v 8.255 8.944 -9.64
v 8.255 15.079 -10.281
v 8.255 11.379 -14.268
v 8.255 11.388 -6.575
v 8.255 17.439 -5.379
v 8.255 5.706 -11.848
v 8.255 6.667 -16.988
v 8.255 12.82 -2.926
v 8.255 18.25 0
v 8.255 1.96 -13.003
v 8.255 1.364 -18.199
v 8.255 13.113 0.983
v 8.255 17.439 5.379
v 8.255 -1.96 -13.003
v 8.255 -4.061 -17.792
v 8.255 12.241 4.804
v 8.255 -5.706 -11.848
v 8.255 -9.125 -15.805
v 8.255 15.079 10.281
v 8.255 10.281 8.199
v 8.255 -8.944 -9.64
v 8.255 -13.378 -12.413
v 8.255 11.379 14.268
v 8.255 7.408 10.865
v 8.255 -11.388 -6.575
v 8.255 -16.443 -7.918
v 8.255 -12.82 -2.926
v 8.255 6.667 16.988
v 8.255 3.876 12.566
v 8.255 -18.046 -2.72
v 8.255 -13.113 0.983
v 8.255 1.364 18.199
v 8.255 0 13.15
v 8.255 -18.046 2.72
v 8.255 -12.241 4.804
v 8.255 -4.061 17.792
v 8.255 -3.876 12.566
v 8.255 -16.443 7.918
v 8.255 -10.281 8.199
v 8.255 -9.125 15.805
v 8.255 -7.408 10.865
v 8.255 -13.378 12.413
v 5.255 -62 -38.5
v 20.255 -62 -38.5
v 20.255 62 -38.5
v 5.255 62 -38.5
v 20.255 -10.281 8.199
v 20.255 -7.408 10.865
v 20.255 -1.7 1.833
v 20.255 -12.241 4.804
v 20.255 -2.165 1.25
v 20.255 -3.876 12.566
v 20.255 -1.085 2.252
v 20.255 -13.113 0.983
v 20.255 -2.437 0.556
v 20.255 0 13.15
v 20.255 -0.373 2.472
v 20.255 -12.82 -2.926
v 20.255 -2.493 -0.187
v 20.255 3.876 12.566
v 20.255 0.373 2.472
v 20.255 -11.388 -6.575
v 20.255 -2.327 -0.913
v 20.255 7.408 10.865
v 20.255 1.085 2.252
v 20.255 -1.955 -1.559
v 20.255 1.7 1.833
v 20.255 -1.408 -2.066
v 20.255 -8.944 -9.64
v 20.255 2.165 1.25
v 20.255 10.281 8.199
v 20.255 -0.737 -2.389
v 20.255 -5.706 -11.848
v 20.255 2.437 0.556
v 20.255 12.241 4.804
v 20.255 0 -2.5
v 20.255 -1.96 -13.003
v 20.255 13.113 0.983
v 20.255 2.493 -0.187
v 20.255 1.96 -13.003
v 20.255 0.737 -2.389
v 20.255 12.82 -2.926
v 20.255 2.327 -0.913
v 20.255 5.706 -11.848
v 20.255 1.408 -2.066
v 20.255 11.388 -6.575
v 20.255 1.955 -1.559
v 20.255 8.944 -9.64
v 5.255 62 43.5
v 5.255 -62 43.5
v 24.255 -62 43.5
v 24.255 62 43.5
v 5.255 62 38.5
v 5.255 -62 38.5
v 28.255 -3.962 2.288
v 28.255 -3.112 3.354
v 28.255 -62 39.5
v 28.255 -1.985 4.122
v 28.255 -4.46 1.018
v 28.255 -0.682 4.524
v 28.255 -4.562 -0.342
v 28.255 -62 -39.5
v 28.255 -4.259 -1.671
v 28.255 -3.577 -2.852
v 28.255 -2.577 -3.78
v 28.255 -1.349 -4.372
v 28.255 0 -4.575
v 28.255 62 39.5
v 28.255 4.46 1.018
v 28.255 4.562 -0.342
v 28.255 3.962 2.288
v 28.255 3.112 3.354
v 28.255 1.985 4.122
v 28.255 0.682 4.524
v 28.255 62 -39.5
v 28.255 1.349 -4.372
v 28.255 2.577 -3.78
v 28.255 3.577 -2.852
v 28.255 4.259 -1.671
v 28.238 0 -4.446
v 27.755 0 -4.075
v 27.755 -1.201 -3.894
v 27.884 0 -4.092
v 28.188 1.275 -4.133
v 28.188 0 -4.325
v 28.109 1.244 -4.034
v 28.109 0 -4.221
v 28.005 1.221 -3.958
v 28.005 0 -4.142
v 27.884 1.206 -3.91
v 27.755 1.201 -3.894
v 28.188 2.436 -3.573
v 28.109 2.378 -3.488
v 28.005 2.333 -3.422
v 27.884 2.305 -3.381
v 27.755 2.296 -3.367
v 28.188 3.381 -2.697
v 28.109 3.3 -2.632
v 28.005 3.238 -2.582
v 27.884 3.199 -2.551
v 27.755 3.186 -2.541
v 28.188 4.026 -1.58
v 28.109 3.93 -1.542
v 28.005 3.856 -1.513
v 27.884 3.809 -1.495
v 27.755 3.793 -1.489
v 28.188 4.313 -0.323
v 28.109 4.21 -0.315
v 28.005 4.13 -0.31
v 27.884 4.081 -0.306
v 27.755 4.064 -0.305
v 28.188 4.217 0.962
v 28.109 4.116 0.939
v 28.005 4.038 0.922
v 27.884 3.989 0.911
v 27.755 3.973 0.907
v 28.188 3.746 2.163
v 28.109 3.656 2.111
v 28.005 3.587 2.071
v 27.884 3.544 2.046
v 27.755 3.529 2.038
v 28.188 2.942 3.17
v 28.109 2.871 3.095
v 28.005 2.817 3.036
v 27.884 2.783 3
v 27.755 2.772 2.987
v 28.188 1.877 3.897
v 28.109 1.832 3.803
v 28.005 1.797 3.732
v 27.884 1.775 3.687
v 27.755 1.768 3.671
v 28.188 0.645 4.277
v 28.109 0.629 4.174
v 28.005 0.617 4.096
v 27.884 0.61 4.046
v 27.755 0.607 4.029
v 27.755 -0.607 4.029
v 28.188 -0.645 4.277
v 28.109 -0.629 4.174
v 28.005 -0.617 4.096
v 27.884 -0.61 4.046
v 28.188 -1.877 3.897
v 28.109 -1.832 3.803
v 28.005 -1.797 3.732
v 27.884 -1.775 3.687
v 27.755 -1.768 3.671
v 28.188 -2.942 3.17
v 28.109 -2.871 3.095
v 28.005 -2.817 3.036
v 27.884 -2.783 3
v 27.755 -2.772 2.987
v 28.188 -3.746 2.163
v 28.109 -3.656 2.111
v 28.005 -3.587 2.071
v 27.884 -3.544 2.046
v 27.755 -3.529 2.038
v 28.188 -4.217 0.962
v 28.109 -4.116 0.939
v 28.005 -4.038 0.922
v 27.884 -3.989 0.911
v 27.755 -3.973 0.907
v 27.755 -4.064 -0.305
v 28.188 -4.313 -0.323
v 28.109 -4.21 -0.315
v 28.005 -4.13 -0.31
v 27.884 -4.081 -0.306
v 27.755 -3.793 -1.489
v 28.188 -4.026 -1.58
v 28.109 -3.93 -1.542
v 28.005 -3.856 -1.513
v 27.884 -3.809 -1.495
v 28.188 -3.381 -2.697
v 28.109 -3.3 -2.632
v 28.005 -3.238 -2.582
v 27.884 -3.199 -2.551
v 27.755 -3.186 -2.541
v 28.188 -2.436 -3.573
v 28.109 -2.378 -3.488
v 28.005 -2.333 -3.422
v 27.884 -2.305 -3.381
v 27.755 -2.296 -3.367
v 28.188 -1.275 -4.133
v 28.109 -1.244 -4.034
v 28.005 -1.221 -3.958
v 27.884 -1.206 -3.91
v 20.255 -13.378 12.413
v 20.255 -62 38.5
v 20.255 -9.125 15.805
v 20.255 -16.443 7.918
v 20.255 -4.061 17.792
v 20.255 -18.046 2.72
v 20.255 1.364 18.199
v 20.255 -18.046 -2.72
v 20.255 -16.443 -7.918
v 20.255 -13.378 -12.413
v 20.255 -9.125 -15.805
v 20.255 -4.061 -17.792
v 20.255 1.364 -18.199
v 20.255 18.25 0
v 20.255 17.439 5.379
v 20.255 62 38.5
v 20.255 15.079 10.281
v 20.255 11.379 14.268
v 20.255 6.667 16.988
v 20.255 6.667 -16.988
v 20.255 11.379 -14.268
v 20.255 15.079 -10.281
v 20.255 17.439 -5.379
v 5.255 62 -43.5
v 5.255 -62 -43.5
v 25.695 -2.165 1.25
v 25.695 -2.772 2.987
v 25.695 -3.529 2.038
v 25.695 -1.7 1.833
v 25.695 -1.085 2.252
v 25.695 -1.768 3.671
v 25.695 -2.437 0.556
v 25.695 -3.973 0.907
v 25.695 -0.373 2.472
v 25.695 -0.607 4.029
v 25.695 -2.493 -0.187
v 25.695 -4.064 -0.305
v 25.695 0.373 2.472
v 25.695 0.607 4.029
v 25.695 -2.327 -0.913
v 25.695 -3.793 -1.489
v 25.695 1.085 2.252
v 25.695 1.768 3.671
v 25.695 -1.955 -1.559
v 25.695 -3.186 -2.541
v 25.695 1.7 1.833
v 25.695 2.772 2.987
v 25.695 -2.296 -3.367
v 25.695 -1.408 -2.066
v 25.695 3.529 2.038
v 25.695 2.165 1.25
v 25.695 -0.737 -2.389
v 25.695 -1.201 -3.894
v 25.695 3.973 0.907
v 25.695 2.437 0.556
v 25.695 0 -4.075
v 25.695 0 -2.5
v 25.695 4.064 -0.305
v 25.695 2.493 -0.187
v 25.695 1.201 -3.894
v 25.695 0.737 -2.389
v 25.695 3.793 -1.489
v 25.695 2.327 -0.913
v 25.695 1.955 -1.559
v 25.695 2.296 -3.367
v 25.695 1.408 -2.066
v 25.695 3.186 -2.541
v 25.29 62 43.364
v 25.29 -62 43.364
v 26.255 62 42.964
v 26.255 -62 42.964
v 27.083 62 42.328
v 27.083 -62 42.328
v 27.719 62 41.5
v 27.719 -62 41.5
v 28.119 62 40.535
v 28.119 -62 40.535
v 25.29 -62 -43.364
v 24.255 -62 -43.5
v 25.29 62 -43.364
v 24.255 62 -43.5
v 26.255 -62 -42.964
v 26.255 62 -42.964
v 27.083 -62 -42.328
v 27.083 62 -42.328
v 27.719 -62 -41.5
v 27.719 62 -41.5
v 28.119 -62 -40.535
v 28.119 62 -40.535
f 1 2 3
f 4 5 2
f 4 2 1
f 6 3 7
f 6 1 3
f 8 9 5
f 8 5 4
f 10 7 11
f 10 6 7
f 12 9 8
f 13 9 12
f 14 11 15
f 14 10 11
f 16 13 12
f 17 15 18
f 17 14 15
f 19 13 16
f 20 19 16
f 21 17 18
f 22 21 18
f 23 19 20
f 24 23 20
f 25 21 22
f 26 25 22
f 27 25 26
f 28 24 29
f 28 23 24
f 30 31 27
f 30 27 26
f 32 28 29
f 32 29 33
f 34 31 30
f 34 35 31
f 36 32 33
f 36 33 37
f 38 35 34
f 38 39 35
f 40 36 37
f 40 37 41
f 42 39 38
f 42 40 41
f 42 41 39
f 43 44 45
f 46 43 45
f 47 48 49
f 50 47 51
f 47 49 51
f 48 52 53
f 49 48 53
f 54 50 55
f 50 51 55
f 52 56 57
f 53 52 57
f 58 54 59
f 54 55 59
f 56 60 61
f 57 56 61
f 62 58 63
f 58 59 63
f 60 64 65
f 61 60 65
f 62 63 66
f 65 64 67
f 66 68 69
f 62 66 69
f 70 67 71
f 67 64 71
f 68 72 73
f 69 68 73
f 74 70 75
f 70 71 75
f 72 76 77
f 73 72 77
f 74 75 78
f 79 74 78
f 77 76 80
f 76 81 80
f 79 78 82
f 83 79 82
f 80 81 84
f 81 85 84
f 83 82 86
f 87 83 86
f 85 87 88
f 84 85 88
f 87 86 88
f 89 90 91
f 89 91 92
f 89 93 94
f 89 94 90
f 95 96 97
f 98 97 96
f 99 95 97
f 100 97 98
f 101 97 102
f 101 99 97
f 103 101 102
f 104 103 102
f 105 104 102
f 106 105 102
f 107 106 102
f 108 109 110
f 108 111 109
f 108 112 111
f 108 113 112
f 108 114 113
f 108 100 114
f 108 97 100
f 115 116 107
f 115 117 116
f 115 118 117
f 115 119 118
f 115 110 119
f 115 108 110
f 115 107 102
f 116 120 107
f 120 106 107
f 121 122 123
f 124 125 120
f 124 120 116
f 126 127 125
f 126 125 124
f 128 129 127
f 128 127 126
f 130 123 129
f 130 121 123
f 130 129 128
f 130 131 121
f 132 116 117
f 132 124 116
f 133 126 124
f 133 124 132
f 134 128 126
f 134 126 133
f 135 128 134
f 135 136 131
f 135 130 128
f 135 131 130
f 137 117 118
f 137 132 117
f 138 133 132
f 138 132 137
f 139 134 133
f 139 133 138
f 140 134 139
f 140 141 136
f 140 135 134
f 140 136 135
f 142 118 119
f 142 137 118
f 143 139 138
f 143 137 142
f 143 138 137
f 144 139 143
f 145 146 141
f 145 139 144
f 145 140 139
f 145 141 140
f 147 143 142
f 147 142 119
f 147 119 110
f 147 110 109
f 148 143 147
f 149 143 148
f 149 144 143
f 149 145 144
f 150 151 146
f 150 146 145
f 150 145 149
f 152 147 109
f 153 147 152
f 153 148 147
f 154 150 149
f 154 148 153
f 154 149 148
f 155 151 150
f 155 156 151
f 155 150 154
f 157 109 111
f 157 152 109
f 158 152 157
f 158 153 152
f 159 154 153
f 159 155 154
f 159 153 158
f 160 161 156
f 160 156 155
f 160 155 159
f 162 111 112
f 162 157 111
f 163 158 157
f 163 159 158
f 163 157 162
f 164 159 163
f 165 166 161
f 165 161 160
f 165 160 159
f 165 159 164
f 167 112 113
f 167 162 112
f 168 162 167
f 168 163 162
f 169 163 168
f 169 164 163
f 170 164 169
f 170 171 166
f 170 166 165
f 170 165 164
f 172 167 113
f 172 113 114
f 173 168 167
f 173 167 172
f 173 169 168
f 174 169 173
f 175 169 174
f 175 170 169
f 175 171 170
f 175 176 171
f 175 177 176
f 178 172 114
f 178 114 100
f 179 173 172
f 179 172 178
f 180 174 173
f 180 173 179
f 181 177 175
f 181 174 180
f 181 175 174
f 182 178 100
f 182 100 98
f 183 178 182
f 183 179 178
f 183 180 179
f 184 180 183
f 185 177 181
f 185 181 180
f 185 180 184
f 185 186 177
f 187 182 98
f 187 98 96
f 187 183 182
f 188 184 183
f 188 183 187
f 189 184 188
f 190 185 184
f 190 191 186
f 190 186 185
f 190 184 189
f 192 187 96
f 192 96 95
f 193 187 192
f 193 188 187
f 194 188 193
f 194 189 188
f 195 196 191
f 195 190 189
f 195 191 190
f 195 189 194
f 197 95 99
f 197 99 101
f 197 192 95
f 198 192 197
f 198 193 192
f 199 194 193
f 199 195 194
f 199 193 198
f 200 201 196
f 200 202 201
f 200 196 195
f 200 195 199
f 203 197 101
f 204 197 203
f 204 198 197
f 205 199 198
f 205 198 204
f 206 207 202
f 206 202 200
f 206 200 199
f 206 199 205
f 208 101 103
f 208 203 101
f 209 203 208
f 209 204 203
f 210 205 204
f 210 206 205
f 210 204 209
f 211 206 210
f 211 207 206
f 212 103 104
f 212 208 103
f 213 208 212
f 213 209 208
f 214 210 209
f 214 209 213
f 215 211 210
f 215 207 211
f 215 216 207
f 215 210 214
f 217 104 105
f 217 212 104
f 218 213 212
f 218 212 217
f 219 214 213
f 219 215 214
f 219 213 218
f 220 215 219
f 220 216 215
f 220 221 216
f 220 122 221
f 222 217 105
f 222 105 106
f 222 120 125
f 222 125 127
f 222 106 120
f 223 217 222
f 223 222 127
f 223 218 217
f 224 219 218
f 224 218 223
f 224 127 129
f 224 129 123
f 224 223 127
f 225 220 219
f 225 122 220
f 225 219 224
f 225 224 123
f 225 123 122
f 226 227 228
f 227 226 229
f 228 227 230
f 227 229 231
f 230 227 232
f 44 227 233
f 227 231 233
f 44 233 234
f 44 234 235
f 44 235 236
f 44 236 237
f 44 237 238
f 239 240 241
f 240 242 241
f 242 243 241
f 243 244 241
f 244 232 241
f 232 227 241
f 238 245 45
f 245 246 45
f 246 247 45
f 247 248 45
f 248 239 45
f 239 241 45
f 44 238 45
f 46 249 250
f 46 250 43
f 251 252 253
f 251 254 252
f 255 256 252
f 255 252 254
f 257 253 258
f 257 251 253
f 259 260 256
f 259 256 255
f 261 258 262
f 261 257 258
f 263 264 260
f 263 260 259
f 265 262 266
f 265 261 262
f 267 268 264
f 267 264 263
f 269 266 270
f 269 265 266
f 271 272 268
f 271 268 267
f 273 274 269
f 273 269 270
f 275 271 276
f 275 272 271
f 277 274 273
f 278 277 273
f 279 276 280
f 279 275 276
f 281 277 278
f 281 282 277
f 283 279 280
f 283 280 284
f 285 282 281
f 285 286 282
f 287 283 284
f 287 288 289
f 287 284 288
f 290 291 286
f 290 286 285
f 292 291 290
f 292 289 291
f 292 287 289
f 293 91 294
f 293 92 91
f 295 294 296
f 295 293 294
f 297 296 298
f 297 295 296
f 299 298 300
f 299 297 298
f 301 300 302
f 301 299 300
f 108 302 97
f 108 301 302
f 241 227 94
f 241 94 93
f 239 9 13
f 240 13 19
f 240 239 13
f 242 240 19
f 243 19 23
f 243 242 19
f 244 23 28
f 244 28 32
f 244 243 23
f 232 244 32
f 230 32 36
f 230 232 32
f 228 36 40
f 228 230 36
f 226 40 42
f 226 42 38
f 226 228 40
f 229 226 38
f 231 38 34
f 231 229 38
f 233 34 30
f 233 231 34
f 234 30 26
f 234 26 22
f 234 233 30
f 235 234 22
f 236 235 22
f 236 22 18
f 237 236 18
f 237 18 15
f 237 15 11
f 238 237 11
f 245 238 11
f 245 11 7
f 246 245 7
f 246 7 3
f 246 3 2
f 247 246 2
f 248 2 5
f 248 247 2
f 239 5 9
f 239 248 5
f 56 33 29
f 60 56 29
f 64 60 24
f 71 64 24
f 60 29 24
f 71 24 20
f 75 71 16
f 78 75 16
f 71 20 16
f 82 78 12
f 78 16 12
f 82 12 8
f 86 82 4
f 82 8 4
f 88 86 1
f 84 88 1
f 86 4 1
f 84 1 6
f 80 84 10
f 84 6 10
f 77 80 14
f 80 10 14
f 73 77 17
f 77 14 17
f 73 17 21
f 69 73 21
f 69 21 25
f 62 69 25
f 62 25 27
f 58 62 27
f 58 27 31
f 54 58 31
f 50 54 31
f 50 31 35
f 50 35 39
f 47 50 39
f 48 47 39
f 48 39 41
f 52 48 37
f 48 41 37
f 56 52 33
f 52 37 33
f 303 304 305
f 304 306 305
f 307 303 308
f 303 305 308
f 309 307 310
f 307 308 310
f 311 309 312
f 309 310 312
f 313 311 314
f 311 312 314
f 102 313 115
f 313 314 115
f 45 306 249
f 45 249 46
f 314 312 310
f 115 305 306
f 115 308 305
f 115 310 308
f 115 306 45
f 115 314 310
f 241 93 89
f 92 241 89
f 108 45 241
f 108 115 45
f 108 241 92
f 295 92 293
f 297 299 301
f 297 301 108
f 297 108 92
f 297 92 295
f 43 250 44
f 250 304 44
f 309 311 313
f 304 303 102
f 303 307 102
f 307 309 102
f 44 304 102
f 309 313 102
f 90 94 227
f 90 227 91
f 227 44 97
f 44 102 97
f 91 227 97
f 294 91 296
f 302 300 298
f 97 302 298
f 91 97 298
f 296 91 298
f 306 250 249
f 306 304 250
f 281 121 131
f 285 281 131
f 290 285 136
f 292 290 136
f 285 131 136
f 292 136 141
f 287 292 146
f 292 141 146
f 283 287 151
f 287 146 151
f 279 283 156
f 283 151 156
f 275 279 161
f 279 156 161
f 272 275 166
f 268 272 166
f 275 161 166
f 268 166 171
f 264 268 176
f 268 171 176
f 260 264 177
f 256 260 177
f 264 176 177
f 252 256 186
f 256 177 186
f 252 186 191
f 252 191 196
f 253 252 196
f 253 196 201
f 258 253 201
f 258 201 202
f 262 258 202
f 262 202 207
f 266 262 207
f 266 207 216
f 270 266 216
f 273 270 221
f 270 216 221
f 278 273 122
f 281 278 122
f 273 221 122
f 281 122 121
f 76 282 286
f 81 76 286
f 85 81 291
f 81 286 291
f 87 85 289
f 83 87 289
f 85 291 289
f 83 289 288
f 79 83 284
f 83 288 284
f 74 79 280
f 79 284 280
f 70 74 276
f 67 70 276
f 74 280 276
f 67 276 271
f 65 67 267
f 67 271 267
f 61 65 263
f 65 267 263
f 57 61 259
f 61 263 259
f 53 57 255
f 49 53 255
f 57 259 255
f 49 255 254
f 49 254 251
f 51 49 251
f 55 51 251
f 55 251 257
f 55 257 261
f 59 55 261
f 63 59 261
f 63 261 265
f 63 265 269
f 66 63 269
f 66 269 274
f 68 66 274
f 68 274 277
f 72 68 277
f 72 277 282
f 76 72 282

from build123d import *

# Parameters (mm, degrees)
SKETCH1_W           = 12
SKETCH1_H           = 18.25
SKETCH2_R           = 3.7145
CUT_EXTRUDE1_DEPTH  = 8.5725
SKETCH3_W           = 87
SKETCH3_H           = 124
BOSS_EXTRUDE1_DEPTH = 8
FILLET1_R           = 4
SKETCH6_R           = 13.15
CUT_EXTRUDE2_DEPTH  = 12
SKETCH12_R          = 4.075
CUT_EXTRUDE6_DEPTH  = 2.56
SKETCH12_6_R        = 2.5
CUT_EXTRUDE7_DEPTH  = 8
FILLET2_R           = 0.5
SKETCH15_W          = 5
SKETCH15_H          = 124
BOSS_EXTRUDE2_DEPTH = 15


with BuildPart() as part:
    # Sketch1 → Revolve1 (revolve)
    with BuildSketch(Plane.XY):
        with Locations((14.255, 9.125)):
            Rectangle(SKETCH1_W, SKETCH1_H)
    revolve(axis=Axis((8.255, 0, 0), (1, 0, 0)))

    # Sketch2 → Cut-Extrude1 (cut)
    with BuildSketch(Plane.ZY.offset(-8.255)):
        Circle(SKETCH2_R)
    extrude(amount=-CUT_EXTRUDE1_DEPTH, mode=Mode.SUBTRACT)

    # Sketch6 → Cut-Extrude2 (cut)
    with BuildSketch(Plane.ZY.offset(-8.255)):
        Circle(SKETCH6_R)
    extrude(amount=-CUT_EXTRUDE2_DEPTH, mode=Mode.SUBTRACT)


with BuildPart() as body_2:
    # Sketch3 → Boss-Extrude1 (new body)
    with BuildSketch(Plane(origin=(20.255, 0, 0), x_dir=(0, 0, -1), z_dir=(1, 0, 0))):
        Rectangle(SKETCH3_W, SKETCH3_H)
    extrude(amount=BOSS_EXTRUDE1_DEPTH)

    # Fillet1
    fillet1_edges = [body_2.edges().sort_by_distance(p)[0] for p in [
        (28.255, 0, -43.5),
        (28.255, 0, 43.5),
    ]]
    fillet(fillet1_edges, radius=FILLET1_R)

    # Sketch12 → Cut-Extrude6 (cut)
    with BuildSketch(Plane(origin=(28.255, 0, 0), x_dir=(0, 0, -1), z_dir=(1, 0, 0))):
        Circle(SKETCH12_R)
    extrude(amount=-CUT_EXTRUDE6_DEPTH, mode=Mode.SUBTRACT)

    # Sketch12<6> → Cut-Extrude7 (cut)
    with BuildSketch(Plane(origin=(28.255, 0, 0), x_dir=(0, 0, -1), z_dir=(1, 0, 0))):
        Circle(SKETCH12_6_R)
    extrude(amount=-CUT_EXTRUDE7_DEPTH, mode=Mode.SUBTRACT)

    # Fillet2
    fillet2_edges = [body_2.edges().sort_by_distance(p)[0] for p in [
        (28.255, 0, 4.075),
    ]]
    fillet(fillet2_edges, radius=FILLET2_R)


with BuildPart() as part_1:
    add(part.part)

    # Combine1: union body 2
    add(body_2.part)

    # Sketch15 → Boss-Extrude2 (add)
    with BuildSketch(Plane.ZY.offset(-20.255)):
        with Locations((-41, 0)):
            Rectangle(SKETCH15_W, SKETCH15_H)
        with Locations((41, 0)):
            Rectangle(SKETCH15_W, SKETCH15_H)
    extrude(amount=BOSS_EXTRUDE2_DEPTH)


solid = part_1.part
